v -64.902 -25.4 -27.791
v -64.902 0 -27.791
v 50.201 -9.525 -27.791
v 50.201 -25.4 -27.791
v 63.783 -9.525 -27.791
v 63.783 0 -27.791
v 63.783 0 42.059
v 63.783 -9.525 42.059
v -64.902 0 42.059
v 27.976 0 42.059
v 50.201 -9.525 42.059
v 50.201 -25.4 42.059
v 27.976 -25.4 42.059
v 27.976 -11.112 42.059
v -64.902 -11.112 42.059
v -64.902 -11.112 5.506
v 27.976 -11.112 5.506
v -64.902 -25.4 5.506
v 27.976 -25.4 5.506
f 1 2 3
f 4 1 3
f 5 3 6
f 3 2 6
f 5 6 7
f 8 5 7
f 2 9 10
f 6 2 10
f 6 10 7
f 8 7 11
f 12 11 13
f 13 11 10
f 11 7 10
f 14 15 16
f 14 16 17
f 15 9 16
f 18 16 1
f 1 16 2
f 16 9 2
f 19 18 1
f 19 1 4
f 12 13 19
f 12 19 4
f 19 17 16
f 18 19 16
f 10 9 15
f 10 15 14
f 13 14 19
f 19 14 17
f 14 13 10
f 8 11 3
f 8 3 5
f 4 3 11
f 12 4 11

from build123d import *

# Parameters (mm, degrees)
F1_DEPTH = 25.4
F0_W     = 92.877152
F0_H     = 36.552329
F2_DEPTH = 11.1125
F0_W_2   = 13.582083
F0_H_2   = 69.85
F3_DEPTH = 9.525


with BuildPart() as f1:
    # F0 (on Front) → F1 (new body)
    with BuildSketch(Plane.XZ):
        Polygon((27.975522, 5.506429), (-64.90163, 5.506429), (-64.90163, -27.791242), (50.200522, -27.791242), (50.200522, 42.058758), (27.975522, 42.058758), align=None)
    extrude(amount=F1_DEPTH)

    # F0 (on Front) → F2 (join)
    with BuildSketch(Plane.XZ):
        with Locations((-18.463054, 23.782593)):
            Rectangle(F0_W, F0_H)
    extrude(amount=F2_DEPTH)

    # F0 (on Front) → F3 (join)
    with BuildSketch(Plane.XZ):
        with Locations((56.991563, 7.133758)):
            Rectangle(F0_W_2, F0_H_2)
    extrude(amount=F3_DEPTH)


solid = f1.part
